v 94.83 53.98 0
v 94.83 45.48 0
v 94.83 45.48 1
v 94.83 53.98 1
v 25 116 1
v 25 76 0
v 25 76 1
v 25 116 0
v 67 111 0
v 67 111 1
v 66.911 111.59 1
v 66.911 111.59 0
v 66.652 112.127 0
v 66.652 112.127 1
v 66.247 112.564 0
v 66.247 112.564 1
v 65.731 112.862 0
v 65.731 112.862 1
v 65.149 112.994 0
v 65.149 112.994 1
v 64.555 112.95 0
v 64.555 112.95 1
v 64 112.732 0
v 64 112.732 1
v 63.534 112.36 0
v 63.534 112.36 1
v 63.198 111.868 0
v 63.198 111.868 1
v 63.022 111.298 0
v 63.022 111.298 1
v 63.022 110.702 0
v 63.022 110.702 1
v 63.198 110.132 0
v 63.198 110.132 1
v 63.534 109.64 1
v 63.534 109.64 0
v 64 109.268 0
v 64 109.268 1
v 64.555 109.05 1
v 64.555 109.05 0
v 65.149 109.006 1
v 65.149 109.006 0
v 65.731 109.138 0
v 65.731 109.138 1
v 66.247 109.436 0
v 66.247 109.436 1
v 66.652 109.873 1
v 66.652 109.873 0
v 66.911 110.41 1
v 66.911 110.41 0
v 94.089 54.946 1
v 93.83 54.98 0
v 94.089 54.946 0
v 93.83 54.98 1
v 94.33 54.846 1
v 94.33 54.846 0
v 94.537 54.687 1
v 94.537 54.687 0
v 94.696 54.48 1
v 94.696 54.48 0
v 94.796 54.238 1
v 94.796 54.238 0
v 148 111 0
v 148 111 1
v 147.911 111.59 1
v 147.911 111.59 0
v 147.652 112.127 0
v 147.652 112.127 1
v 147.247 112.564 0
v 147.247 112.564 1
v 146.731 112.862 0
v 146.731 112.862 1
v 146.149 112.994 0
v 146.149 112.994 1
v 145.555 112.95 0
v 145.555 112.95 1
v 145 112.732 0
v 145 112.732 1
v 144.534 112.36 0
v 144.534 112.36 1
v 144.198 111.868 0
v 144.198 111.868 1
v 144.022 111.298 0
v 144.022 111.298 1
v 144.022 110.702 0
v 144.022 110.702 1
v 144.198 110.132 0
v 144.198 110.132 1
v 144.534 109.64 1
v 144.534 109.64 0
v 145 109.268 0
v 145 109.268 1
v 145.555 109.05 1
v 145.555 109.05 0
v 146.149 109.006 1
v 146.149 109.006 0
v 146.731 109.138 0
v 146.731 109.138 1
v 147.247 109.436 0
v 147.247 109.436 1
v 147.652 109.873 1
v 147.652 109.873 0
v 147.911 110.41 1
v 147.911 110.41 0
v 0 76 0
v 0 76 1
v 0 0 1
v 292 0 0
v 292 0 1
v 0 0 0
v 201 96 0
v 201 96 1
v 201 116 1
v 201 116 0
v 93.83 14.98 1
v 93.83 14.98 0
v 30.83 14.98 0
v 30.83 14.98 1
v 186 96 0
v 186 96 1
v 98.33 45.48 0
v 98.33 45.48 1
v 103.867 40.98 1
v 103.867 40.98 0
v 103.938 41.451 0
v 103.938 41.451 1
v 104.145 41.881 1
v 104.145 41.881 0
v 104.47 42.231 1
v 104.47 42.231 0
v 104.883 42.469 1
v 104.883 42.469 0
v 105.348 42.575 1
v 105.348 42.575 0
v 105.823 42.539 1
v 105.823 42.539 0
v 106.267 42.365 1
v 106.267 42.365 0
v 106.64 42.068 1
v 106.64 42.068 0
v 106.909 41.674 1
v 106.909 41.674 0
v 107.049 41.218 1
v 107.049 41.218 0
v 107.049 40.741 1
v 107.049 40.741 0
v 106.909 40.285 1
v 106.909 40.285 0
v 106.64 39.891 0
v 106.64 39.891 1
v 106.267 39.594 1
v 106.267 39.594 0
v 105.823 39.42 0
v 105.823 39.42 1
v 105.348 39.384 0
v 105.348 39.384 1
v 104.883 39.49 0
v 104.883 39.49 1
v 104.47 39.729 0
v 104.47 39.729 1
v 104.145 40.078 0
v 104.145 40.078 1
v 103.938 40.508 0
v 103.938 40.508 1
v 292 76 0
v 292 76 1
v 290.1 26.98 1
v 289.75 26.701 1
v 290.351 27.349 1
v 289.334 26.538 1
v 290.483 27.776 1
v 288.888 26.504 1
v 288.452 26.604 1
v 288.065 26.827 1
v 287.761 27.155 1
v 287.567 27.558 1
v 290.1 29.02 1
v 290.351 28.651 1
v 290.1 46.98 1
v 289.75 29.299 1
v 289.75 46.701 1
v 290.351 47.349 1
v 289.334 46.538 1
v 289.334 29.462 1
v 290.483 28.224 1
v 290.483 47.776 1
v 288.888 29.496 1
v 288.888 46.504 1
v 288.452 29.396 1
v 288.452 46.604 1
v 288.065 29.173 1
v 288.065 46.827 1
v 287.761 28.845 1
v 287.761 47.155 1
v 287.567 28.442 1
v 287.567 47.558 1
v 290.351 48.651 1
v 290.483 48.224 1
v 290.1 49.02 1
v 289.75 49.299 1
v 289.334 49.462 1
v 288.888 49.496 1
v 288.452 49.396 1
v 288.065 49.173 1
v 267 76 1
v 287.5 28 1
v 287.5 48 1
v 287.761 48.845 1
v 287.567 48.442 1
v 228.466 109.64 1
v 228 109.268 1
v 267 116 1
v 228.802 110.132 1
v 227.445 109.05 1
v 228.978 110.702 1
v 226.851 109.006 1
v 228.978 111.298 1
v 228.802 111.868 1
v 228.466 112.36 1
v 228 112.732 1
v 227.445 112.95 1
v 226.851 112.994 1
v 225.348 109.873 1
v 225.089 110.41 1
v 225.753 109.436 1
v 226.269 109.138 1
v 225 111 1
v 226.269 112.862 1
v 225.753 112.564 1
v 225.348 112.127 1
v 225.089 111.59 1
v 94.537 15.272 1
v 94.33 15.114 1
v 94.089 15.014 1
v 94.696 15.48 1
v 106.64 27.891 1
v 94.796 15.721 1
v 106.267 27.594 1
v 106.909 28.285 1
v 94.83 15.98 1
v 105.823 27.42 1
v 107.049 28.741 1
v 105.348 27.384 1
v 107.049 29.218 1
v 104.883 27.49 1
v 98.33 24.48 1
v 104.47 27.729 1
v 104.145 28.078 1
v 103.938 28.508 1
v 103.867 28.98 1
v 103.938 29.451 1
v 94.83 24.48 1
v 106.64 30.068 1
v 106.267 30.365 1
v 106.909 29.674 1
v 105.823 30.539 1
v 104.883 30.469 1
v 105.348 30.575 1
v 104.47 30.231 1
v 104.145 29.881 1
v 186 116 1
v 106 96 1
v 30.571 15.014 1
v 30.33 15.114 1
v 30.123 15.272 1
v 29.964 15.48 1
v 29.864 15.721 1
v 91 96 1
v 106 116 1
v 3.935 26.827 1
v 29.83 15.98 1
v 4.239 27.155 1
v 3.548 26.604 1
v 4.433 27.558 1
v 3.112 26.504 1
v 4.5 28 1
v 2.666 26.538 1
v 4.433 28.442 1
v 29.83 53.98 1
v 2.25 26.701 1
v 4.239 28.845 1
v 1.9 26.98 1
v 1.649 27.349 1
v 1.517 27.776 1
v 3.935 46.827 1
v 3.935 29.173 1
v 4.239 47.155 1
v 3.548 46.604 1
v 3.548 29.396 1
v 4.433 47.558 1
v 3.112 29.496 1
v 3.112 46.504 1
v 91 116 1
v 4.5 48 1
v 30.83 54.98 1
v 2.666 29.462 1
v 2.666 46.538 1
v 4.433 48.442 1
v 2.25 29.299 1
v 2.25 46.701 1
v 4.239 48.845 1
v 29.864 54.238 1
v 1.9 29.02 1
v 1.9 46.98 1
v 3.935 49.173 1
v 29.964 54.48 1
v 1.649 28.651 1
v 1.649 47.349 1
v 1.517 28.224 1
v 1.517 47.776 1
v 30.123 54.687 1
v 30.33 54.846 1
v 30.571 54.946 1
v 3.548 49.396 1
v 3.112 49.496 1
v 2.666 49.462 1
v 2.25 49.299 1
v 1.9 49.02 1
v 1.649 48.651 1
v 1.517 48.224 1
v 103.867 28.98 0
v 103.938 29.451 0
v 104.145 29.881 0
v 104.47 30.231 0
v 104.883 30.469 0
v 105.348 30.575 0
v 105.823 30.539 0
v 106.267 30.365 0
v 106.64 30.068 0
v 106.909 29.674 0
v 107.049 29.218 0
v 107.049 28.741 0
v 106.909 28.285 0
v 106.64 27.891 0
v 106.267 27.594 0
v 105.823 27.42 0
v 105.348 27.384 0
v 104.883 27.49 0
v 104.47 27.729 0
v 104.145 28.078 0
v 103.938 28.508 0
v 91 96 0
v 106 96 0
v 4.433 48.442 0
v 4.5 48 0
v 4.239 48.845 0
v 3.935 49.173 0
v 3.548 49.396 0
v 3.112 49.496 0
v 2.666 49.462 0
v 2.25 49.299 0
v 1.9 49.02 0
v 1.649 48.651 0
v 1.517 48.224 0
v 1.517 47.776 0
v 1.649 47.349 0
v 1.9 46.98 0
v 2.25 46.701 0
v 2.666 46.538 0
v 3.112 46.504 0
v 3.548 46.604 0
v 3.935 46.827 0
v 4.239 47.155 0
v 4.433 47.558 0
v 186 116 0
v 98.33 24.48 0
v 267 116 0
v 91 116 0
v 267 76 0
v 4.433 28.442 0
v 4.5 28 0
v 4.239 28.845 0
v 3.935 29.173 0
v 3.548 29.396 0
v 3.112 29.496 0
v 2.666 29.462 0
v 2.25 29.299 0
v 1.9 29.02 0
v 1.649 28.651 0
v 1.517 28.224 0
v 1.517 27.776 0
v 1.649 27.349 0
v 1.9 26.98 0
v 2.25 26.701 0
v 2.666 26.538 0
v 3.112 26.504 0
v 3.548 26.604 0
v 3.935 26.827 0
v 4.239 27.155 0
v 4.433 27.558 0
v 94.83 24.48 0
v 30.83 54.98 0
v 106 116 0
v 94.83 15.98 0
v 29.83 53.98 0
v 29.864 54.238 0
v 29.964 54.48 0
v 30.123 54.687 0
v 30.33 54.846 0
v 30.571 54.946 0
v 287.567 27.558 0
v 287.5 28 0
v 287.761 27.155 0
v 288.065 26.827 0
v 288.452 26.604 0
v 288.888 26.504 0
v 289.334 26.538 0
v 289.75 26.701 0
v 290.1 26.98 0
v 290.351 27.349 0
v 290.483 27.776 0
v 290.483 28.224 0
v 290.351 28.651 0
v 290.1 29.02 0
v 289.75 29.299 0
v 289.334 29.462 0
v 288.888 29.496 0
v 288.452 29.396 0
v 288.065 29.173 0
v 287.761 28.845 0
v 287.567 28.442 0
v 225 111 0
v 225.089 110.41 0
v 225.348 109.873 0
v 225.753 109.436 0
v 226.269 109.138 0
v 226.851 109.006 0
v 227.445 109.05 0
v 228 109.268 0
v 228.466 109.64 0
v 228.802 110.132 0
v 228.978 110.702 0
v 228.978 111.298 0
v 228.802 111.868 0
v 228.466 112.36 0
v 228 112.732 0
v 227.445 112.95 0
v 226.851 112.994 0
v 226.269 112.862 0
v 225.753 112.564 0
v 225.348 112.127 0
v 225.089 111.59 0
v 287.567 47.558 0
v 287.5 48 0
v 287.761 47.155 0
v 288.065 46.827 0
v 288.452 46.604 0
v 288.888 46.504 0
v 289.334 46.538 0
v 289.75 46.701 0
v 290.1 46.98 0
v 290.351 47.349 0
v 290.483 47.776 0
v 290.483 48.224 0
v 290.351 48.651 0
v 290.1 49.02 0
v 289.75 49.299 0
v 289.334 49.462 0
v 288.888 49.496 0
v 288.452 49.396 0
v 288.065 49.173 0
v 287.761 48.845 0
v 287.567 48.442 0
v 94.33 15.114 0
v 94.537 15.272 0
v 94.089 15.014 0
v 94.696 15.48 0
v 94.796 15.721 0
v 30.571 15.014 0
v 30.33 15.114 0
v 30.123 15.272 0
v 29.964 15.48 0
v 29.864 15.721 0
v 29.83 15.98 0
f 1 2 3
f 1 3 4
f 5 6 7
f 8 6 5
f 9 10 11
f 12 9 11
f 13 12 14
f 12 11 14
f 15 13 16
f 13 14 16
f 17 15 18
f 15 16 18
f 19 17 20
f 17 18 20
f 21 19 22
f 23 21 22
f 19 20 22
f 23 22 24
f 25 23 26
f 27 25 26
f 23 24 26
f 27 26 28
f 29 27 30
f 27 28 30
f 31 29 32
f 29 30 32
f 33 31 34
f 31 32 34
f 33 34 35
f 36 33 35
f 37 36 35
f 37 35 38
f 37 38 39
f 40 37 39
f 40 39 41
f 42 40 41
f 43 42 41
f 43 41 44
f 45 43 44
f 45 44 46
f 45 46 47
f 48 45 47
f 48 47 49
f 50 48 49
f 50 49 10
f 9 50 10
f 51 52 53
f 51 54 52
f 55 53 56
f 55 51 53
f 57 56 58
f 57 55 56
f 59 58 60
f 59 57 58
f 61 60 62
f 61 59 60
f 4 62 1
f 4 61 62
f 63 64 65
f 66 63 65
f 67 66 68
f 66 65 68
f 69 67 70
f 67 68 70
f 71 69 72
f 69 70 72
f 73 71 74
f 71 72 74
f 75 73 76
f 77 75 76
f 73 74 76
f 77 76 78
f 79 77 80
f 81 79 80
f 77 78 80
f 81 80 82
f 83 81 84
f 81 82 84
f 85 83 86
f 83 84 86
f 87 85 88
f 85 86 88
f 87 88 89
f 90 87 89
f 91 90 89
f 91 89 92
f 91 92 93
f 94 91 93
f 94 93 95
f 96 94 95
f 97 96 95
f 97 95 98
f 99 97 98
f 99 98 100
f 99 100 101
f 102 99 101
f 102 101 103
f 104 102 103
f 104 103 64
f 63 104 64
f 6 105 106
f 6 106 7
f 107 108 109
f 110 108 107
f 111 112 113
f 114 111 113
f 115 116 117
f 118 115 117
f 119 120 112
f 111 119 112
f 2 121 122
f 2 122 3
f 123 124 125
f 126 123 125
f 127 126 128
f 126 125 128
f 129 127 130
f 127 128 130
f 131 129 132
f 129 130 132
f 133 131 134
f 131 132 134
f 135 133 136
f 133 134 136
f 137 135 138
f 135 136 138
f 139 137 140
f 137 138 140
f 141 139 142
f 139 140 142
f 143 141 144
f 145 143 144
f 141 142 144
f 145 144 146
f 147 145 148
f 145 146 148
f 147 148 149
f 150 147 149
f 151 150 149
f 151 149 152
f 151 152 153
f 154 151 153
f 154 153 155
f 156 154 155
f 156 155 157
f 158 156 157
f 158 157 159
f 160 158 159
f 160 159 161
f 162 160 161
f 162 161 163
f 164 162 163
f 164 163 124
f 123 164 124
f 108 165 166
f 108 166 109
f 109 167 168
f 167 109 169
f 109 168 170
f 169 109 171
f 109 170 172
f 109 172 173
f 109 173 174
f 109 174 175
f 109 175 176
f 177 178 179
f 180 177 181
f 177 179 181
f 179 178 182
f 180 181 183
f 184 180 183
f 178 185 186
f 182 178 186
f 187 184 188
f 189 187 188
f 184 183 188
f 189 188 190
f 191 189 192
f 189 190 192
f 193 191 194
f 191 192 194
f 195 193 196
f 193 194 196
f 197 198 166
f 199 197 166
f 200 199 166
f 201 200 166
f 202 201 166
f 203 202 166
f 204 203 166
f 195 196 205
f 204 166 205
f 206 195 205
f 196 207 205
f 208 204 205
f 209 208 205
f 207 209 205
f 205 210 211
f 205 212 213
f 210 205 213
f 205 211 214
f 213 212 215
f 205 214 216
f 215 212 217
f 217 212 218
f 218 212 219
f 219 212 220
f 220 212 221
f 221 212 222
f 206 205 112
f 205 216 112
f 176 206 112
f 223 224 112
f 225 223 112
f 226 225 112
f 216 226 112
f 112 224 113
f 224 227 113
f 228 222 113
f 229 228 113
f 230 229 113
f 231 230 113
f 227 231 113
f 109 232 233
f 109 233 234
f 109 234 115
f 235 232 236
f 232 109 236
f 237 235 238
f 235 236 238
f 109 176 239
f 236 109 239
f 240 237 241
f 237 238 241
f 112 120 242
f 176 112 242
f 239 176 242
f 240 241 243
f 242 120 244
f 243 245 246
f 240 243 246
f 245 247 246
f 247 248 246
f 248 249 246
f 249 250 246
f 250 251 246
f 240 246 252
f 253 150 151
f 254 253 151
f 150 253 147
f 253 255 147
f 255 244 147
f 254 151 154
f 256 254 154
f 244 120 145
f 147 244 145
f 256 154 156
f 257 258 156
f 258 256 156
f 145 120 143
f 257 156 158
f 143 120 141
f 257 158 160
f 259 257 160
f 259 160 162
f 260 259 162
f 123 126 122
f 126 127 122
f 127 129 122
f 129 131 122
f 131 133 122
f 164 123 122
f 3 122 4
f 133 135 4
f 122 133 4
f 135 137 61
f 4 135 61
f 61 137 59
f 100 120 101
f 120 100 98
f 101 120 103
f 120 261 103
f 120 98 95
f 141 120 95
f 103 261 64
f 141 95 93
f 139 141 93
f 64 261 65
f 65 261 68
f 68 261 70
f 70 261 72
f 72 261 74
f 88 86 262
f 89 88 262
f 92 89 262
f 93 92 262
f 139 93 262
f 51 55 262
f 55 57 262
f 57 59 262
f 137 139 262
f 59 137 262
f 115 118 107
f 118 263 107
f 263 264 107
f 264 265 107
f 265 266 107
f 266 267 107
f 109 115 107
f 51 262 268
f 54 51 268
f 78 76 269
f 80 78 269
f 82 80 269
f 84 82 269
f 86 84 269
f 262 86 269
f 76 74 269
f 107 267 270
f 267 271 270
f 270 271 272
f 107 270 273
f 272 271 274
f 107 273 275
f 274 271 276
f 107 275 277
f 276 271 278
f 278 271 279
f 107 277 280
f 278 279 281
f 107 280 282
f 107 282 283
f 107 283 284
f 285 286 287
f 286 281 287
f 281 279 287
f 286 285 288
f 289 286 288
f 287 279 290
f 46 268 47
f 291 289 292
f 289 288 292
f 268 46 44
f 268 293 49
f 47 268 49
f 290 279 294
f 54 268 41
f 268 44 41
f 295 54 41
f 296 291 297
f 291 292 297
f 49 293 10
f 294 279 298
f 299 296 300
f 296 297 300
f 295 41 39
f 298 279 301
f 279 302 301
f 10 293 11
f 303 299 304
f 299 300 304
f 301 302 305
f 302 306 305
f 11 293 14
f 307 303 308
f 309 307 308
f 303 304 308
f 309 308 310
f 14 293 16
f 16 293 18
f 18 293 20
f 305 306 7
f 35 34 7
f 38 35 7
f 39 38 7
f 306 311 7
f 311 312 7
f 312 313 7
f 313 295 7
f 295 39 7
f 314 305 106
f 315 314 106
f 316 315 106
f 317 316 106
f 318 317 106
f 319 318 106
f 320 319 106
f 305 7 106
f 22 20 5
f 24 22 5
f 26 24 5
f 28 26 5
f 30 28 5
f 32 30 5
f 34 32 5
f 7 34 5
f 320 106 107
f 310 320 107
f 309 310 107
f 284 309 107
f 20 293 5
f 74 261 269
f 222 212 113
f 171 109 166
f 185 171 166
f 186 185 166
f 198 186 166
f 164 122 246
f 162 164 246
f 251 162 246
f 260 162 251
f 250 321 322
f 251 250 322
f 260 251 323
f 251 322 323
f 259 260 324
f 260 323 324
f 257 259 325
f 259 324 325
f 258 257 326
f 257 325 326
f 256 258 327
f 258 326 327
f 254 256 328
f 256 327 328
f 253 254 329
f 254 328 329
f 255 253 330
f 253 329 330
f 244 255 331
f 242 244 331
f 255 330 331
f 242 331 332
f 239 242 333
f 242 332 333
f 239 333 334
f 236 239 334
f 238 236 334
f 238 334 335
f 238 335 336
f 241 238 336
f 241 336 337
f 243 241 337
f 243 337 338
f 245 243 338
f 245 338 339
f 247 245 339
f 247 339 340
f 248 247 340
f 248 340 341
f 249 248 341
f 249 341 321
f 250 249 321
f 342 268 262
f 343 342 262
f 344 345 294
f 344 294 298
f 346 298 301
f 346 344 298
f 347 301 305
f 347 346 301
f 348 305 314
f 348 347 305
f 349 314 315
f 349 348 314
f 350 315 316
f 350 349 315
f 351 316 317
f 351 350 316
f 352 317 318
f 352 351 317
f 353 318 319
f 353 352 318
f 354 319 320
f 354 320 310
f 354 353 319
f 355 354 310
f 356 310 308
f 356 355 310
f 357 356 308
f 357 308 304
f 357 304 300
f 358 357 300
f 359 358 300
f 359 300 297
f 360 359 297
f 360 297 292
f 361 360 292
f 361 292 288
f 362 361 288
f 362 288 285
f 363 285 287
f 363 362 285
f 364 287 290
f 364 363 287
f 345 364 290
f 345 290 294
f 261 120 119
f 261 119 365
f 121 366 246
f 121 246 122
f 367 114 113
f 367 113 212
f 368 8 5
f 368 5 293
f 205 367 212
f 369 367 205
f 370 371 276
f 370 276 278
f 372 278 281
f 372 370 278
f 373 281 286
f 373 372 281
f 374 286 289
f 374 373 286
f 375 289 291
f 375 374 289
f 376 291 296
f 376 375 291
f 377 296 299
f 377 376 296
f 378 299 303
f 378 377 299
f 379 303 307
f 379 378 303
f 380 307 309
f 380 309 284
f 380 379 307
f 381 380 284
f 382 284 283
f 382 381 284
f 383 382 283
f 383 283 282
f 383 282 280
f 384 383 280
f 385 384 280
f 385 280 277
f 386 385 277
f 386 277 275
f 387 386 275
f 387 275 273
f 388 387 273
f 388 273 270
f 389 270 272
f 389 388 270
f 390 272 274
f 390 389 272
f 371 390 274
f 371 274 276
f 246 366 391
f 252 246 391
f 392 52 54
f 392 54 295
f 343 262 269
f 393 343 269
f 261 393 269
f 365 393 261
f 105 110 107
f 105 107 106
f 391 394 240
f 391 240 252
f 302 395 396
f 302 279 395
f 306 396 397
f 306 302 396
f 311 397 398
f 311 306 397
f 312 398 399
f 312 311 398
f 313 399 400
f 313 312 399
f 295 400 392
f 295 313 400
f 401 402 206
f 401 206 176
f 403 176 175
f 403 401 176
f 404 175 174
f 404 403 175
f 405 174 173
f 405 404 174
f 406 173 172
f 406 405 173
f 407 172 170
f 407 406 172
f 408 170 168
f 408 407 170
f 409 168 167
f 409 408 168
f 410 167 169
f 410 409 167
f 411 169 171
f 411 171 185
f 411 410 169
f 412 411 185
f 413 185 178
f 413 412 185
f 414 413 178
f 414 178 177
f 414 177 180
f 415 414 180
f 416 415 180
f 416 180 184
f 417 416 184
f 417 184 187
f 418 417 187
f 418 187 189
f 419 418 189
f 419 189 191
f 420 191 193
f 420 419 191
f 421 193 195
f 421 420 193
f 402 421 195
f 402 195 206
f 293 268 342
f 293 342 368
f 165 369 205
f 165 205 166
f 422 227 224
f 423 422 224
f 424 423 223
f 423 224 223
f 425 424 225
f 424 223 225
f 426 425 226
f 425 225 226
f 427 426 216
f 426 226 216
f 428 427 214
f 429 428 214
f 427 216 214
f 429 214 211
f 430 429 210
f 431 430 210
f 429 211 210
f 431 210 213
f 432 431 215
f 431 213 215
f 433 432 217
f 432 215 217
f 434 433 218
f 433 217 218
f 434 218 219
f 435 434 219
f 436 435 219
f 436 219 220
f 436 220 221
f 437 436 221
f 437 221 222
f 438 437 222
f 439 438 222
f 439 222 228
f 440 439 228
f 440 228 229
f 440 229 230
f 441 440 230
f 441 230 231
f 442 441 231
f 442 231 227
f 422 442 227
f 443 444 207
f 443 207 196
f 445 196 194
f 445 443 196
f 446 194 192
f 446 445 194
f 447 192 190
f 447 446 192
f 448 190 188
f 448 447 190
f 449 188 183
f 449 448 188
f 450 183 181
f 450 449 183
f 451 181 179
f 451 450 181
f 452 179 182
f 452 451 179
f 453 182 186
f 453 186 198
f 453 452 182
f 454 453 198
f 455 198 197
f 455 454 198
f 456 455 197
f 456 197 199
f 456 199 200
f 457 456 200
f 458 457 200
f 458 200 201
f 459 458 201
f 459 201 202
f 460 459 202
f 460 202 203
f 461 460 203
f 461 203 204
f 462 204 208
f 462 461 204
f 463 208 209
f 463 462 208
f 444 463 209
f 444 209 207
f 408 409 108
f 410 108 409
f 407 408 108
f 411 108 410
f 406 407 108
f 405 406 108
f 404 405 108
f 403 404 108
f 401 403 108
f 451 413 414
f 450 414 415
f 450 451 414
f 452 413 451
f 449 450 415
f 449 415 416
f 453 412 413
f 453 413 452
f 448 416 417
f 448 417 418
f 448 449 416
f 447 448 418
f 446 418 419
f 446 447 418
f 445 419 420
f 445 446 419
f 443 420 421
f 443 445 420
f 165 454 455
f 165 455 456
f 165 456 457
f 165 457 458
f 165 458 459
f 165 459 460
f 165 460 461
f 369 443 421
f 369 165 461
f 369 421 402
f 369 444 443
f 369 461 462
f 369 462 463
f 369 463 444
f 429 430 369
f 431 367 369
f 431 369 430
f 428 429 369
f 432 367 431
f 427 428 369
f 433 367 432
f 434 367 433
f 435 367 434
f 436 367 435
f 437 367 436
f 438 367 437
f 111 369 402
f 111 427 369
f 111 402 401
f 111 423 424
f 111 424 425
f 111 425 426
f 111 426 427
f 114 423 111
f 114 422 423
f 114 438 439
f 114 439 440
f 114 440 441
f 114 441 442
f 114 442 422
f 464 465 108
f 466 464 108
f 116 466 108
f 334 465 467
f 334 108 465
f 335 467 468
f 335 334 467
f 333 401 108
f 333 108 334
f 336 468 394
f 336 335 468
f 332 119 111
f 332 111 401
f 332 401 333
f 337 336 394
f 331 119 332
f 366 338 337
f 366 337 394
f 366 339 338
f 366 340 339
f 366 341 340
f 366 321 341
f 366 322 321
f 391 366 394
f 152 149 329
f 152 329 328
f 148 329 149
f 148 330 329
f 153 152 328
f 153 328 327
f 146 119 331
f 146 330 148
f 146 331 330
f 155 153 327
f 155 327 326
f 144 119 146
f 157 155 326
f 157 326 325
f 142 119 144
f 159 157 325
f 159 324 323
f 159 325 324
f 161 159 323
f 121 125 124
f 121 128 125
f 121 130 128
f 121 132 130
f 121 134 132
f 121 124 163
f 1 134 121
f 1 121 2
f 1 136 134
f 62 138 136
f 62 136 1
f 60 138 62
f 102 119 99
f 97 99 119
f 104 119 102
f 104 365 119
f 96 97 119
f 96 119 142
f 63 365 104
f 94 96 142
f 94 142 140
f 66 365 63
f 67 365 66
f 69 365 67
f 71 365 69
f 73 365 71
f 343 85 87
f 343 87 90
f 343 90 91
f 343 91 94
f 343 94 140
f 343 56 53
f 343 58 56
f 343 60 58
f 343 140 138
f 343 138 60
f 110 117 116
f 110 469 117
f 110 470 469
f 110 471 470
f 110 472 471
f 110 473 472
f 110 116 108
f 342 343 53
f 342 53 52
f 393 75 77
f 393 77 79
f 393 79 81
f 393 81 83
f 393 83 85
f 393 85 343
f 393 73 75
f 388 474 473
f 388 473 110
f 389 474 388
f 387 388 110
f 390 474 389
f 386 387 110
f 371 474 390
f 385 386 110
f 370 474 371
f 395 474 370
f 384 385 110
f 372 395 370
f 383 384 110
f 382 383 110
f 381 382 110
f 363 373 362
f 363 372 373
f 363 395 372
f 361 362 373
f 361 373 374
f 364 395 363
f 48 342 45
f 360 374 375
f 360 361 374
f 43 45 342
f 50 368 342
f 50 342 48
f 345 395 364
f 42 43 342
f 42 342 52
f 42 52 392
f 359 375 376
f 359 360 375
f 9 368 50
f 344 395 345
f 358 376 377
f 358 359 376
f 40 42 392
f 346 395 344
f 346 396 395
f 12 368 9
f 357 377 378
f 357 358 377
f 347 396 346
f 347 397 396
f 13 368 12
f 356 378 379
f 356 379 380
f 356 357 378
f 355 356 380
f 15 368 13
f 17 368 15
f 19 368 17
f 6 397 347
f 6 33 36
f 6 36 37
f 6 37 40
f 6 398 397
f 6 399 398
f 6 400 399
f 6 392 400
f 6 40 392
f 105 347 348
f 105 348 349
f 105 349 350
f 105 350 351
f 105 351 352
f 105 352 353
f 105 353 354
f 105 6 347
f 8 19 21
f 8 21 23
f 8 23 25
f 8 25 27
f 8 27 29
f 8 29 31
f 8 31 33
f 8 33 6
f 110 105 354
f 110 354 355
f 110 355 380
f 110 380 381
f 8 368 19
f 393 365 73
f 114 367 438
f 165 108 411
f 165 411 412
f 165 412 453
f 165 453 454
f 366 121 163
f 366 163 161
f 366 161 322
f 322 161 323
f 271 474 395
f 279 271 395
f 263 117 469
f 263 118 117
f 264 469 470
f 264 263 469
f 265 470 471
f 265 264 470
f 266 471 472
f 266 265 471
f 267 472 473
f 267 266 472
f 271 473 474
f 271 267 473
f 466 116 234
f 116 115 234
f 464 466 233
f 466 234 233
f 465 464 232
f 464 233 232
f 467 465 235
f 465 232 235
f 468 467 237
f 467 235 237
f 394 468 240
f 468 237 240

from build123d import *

# Parameters (mm, degrees)
SKETCH_1_R          = 1.5
EXTRUDE_1_DEPTH     = 1
SKETCH_2_R          = 2
SKETCH_2_W          = 15
SKETCH_2_H          = 20
CUT_EXTRUDE_1_DEPTH = 315.198981539
SKETCH_3_W          = 65
SKETCH_3_H          = 40
CUT_EXTRUDE_5_DEPTH = 10
SKETCH_4_W          = 3.5
SKETCH_4_H          = 21
CUT_EXTRUDE_6_DEPTH = 10
SKETCH_6_R          = 1.6
CUT_EXTRUDE_8_DEPTH = 2
FILLET_1_R          = 1


with BuildPart() as part:
    # 草图1 → 凸台-拉伸1 (new body)
    with BuildSketch(Plane.XY):
        Polygon((0, 0), (0, 76), (25, 76), (25, 116), (267, 116), (267, 76), (292, 76), (292, 0), align=None)
        with Locations((3, 48)):
            Circle(SKETCH_1_R, mode=Mode.SUBTRACT)
        with Locations((3, 28)):
            Circle(SKETCH_1_R, mode=Mode.SUBTRACT)
        with Locations(Location((289, 28, 0), (0, 0, 180))):
            Circle(SKETCH_1_R, mode=Mode.SUBTRACT)
        with Locations(Location((289, 48, 0), (0, 0, 180))):
            Circle(SKETCH_1_R, mode=Mode.SUBTRACT)
    extrude(amount=EXTRUDE_1_DEPTH)

    # 草图2 → 切除-拉伸1 (cut, through all)
    with BuildSketch(Plane.XY.offset(1)):
        with Locations((65, 111)):
            Circle(SKETCH_2_R)
        with Locations(Location((227, 111, 0), (0, 0, 180))):
            Circle(SKETCH_2_R)
        with Locations((146, 111)):
            Circle(SKETCH_2_R)
        with Locations((193.5, 106)):
            Rectangle(SKETCH_2_W, SKETCH_2_H)
        with Locations((98.5, 106)):
            Rectangle(SKETCH_2_W, SKETCH_2_H)
    extrude(amount=-CUT_EXTRUDE_1_DEPTH, mode=Mode.SUBTRACT)

    # 草图3 → 切除-拉伸5 (cut)
    with BuildSketch(Plane(origin=(0, 0, 0), x_dir=(-1, 0, 0), z_dir=(0, 0, -1))):
        with Locations((-62.330283152, 34.979584943)):
            Rectangle(SKETCH_3_W, SKETCH_3_H)
    extrude(amount=-CUT_EXTRUDE_5_DEPTH, mode=Mode.SUBTRACT)

    # 草图4 → 切除-拉伸6 (cut)
    with BuildSketch(Plane(origin=(0, 0, 0), x_dir=(-1, 0, 0), z_dir=(0, 0, -1))):
        with Locations((-96.580283152, 34.979584943)):
            Rectangle(SKETCH_4_W, SKETCH_4_H)
    extrude(amount=-CUT_EXTRUDE_6_DEPTH, mode=Mode.SUBTRACT)

    # 草图6 → 切除-拉伸8 (cut)
    with BuildSketch(Plane(origin=(0, 0, 0), x_dir=(-1, 0, 0), z_dir=(0, 0, -1))):
        with Locations((-105.467130331, 28.979584943)):
            Circle(SKETCH_6_R)
        with Locations((-105.467130331, 40.979584943)):
            Circle(SKETCH_6_R)
    extrude(amount=-CUT_EXTRUDE_8_DEPTH, mode=Mode.SUBTRACT)

    # 圆角1
    fillet_1_edges = [part.edges().sort_by_distance(p)[0] for p in [
        (29.830283152, 54.979584943, 0.5),
        (29.830283152, 14.979584943, 0.5),
        (94.830283152, 14.979584943, 0.5),
        (94.830283152, 54.979584943, 0.5),
    ]]
    fillet(fillet_1_edges, radius=FILLET_1_R)


solid = part.part
